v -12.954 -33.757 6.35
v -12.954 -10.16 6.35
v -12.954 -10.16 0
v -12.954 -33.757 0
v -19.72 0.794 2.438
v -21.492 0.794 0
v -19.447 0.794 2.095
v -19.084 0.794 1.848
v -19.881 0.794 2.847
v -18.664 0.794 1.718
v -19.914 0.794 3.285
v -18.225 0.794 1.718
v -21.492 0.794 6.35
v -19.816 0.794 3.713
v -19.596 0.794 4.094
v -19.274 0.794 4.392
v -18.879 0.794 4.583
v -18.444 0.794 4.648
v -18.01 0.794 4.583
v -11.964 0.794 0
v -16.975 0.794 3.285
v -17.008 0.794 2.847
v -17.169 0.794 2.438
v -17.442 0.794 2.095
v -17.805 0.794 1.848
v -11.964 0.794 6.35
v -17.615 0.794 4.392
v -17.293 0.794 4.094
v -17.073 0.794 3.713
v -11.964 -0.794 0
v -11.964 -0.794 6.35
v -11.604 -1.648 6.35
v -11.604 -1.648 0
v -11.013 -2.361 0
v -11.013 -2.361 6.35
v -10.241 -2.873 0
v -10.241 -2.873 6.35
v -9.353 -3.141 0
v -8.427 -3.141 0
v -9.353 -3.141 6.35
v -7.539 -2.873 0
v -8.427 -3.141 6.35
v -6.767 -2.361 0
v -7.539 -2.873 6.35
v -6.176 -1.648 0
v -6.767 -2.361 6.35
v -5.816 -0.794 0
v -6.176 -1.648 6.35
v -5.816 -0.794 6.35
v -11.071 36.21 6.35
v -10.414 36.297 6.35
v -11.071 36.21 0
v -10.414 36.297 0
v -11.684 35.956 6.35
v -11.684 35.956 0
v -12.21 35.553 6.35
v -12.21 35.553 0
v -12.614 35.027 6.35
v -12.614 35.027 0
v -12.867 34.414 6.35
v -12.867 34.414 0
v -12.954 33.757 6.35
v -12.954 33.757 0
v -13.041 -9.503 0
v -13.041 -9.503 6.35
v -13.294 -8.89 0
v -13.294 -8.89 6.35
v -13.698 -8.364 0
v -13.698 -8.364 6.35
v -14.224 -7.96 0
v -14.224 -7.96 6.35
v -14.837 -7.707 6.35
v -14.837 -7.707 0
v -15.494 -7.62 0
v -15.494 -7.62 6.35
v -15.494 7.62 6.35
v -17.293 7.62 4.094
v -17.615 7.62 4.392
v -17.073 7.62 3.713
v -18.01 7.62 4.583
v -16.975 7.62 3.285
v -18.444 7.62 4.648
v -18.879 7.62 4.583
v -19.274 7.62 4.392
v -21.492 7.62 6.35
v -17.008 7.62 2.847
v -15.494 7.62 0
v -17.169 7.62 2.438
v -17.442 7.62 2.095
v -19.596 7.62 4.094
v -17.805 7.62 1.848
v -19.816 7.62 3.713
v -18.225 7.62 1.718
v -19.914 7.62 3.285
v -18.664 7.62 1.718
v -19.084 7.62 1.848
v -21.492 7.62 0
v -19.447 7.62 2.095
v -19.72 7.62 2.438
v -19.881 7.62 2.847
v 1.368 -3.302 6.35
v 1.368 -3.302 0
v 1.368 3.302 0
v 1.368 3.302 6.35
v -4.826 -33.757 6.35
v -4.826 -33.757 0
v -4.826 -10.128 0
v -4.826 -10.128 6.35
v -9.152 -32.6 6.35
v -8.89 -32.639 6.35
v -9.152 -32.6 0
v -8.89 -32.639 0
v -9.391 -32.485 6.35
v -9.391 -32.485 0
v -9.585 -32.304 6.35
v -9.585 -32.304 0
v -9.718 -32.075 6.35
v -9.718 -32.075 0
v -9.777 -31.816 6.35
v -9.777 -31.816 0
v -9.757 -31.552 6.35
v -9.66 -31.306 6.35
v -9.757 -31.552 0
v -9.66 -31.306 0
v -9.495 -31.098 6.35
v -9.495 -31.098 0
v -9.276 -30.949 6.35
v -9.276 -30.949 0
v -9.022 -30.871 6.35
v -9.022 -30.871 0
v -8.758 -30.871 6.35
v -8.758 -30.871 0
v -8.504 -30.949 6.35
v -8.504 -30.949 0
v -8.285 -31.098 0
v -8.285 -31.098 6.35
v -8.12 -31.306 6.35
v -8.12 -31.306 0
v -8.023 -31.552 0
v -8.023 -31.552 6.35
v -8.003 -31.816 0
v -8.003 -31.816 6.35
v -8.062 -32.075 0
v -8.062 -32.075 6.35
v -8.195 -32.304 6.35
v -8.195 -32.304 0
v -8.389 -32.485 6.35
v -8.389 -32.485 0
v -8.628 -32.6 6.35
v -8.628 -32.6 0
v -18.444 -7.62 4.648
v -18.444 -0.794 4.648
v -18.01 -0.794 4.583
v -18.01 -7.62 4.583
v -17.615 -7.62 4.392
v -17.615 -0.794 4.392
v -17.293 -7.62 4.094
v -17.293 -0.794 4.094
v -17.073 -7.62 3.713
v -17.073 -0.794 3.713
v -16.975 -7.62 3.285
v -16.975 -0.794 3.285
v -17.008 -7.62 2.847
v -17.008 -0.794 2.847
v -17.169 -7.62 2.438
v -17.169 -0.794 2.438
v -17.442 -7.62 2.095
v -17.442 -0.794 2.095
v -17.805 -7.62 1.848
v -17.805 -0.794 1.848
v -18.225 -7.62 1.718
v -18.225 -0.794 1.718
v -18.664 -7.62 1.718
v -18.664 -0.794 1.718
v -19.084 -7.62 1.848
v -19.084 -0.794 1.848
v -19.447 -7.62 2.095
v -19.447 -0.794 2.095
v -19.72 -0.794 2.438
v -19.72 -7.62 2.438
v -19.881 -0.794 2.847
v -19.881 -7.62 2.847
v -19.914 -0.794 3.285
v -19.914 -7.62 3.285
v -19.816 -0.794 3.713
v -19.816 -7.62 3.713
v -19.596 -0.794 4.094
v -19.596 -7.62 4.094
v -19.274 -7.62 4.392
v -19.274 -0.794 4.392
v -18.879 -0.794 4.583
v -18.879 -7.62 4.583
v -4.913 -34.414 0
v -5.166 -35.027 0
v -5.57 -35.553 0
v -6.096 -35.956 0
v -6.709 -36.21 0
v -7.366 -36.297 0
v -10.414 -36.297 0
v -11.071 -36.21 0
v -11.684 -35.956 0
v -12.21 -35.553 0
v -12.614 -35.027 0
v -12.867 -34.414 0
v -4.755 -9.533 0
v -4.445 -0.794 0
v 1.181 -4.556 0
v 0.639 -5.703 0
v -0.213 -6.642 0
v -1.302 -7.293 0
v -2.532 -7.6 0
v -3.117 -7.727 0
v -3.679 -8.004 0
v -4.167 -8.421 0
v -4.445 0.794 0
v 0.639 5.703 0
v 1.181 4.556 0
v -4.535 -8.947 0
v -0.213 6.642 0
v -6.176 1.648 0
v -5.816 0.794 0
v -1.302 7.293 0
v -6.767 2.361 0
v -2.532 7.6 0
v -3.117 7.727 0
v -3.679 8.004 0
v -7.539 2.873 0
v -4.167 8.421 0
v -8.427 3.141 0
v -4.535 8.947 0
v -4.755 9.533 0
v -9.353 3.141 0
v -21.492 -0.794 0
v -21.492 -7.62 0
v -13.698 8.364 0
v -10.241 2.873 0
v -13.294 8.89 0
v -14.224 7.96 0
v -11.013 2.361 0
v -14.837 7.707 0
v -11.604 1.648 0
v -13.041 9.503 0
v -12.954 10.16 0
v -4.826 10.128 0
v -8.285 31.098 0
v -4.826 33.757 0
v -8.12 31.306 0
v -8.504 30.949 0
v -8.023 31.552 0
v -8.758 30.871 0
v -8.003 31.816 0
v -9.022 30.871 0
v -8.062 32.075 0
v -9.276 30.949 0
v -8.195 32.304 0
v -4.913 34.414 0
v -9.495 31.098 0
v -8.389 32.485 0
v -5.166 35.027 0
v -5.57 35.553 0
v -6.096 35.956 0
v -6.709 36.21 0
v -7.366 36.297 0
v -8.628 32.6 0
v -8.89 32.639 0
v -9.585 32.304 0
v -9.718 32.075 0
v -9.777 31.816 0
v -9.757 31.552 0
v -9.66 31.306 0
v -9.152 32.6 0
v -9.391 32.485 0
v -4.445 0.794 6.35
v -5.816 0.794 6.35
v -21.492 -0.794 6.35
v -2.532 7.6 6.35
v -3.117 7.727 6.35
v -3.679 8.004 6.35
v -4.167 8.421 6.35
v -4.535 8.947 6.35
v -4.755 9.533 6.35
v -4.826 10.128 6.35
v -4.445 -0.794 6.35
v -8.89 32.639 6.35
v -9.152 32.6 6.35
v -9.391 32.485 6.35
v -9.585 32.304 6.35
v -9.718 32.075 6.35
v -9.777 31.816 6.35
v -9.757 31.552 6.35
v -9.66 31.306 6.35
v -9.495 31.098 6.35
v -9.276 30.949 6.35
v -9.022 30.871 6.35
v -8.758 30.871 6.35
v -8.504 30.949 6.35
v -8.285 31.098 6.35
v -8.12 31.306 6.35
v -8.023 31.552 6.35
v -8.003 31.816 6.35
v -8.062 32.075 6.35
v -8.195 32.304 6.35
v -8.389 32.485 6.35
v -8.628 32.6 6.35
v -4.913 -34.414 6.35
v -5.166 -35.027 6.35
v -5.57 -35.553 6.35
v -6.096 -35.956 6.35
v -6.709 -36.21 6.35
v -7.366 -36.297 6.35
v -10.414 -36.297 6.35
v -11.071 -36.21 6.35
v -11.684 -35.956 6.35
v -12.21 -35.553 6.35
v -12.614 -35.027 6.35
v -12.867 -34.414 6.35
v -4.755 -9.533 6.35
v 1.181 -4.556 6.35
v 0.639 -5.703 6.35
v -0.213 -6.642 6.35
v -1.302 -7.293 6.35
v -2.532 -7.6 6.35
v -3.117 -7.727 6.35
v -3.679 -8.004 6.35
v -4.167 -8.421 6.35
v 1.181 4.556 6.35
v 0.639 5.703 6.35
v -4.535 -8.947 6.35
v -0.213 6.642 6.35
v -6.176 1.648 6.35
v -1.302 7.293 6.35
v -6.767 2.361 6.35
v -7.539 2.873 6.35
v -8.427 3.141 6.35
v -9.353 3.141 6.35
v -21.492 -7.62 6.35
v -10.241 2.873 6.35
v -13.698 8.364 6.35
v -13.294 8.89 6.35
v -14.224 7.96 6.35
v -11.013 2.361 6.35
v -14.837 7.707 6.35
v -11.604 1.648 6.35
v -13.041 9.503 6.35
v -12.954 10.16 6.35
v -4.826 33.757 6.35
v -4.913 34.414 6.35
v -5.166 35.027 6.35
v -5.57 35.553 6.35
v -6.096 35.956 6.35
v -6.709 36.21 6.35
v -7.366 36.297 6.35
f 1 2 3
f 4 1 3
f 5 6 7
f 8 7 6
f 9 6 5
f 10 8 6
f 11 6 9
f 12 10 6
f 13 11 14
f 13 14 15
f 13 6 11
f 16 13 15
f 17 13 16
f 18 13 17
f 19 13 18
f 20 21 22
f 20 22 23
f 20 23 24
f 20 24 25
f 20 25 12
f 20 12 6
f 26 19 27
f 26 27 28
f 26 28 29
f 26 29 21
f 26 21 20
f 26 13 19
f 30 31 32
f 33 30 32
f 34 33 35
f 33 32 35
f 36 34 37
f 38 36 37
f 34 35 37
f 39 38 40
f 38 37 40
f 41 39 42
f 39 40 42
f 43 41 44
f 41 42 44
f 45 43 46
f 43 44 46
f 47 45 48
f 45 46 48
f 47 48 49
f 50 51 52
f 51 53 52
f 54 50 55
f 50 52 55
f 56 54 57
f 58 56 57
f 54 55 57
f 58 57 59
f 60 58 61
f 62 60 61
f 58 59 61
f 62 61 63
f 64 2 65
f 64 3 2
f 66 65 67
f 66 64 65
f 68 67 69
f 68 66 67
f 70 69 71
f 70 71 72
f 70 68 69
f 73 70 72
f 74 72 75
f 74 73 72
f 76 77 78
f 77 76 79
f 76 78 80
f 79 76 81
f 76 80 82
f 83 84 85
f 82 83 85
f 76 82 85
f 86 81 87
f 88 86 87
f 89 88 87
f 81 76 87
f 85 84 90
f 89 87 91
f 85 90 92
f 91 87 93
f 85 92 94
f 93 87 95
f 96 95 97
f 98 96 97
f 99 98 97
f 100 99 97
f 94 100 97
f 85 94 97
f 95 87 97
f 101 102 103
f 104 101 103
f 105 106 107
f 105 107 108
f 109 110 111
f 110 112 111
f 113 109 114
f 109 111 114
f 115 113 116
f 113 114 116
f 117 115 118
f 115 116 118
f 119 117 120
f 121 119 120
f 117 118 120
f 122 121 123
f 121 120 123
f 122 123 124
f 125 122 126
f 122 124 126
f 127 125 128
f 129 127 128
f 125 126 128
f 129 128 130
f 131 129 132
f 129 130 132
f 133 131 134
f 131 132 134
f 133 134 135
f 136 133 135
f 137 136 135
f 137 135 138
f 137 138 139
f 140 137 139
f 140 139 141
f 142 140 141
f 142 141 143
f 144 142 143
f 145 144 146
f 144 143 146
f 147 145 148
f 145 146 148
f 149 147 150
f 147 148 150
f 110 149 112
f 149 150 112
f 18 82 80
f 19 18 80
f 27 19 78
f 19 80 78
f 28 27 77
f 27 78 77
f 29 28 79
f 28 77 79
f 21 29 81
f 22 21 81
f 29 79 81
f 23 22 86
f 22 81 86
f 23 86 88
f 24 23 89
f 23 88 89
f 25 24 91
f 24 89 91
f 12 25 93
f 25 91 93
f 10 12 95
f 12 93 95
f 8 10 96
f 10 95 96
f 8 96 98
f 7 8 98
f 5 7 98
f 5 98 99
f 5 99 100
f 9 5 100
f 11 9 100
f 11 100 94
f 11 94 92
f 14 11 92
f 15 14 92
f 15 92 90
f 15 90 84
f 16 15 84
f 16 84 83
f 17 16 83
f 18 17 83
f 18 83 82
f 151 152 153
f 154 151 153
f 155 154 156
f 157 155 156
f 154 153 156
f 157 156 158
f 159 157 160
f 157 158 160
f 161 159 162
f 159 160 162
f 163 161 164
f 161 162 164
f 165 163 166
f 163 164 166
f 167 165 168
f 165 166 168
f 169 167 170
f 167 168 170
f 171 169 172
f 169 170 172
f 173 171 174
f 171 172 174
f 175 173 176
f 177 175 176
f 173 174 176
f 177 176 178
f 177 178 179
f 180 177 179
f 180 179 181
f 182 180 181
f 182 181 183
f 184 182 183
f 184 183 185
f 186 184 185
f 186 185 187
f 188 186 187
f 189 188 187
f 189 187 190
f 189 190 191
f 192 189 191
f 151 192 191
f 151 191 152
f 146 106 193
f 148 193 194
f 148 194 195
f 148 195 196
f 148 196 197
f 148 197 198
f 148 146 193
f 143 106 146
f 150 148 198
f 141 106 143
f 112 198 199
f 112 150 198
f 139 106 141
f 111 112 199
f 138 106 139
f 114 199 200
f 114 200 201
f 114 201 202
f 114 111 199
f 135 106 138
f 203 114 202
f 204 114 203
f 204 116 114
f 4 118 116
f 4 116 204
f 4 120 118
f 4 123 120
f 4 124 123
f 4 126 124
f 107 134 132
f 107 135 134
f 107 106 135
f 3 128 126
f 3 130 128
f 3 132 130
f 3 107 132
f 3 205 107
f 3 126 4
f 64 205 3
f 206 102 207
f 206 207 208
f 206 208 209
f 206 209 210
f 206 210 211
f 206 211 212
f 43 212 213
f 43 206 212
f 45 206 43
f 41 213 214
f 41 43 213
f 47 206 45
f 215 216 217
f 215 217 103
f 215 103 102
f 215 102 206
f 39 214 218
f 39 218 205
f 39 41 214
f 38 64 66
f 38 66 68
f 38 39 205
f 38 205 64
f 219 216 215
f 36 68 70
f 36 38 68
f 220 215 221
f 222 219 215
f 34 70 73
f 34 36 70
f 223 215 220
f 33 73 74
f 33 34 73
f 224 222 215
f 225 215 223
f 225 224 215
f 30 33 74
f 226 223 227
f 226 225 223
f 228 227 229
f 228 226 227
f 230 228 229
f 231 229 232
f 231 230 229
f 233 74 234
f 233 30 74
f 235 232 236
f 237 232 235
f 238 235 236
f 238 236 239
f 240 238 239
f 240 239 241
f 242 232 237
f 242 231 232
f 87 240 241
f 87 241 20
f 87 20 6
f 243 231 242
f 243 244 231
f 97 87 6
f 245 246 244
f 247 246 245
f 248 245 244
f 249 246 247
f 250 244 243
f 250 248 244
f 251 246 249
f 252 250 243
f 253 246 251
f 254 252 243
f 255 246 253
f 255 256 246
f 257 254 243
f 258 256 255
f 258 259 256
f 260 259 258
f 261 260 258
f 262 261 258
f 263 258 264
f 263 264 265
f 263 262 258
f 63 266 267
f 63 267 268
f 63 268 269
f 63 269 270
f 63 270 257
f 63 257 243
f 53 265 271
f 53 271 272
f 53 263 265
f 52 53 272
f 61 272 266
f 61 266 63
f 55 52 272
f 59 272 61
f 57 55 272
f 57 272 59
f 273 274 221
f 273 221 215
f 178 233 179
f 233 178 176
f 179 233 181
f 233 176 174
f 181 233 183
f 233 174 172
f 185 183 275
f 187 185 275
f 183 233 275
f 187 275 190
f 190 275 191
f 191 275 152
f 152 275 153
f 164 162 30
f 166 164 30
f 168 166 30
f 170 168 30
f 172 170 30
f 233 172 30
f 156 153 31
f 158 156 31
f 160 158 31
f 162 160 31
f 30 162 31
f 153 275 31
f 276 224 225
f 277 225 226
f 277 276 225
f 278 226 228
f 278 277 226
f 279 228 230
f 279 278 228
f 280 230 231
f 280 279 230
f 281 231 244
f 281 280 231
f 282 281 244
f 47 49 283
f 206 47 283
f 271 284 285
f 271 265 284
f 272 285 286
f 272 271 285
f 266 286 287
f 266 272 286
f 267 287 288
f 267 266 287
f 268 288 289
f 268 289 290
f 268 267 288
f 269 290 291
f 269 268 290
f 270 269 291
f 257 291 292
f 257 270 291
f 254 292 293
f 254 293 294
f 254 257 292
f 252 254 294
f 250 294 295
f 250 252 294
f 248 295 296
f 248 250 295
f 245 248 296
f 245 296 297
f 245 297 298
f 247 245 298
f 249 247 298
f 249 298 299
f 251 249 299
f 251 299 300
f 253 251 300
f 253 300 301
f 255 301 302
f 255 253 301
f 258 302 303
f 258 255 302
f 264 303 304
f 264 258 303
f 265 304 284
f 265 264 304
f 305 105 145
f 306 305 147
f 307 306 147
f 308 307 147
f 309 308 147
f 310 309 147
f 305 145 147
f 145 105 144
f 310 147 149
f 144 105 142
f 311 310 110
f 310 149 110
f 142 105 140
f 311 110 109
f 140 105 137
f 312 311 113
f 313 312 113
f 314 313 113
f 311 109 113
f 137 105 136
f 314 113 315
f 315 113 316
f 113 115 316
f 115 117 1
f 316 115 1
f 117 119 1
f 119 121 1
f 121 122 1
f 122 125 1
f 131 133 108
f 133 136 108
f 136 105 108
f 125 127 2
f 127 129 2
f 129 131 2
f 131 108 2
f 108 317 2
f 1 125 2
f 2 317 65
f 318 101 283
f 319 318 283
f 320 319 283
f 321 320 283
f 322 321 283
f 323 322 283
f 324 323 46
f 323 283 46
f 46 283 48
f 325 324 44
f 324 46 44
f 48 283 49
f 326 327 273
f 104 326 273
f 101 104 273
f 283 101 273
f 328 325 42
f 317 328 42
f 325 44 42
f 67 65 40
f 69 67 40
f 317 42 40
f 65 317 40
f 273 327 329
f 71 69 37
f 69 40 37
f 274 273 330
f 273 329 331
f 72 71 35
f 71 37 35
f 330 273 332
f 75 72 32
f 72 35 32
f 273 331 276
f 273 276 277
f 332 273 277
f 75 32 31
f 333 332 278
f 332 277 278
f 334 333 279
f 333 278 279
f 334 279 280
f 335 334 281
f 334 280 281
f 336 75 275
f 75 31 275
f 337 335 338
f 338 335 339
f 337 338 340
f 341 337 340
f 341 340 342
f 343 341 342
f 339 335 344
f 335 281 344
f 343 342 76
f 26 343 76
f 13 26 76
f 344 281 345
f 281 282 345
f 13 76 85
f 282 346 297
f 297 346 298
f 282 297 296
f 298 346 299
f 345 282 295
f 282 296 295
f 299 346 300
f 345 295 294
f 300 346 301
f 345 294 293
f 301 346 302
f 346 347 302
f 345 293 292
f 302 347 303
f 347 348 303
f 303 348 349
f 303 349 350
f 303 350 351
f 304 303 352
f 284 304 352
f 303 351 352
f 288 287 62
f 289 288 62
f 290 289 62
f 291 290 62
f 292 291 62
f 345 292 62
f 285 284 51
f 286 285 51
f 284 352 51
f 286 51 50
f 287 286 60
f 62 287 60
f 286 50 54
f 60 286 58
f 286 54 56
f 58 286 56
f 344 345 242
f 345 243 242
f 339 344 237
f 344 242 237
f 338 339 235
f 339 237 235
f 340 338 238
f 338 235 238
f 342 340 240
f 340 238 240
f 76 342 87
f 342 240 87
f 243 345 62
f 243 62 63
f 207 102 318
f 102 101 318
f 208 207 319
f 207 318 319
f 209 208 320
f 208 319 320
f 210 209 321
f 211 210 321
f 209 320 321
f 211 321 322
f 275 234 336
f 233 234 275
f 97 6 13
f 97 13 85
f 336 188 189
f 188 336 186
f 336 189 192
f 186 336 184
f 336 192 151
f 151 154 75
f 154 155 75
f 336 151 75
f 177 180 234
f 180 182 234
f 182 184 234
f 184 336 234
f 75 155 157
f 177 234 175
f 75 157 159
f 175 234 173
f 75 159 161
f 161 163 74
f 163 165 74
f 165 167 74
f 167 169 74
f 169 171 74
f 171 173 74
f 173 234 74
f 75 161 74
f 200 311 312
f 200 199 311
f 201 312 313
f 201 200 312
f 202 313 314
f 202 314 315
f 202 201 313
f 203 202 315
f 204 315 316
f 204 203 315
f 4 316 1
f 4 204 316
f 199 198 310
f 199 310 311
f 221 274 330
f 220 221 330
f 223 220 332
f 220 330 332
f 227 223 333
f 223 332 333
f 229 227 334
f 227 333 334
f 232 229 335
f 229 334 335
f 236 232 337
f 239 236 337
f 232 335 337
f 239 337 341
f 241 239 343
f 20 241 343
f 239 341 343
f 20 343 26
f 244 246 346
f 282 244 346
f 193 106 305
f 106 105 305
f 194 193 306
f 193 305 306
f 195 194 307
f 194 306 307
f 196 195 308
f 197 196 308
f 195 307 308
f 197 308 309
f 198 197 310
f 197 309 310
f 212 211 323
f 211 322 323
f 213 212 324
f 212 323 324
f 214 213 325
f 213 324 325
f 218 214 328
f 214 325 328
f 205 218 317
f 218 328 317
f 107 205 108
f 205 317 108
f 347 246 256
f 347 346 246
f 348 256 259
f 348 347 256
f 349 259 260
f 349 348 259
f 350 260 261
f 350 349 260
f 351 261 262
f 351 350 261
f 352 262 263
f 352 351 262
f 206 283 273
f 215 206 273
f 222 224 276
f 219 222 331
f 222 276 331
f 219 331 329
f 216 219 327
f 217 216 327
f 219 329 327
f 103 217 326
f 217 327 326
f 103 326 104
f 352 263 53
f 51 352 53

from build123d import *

# Parameters (mm, degrees)
EXTRUDE1_DEPTH              = 6.35
SKETCH2_W                   = 17.047492734
SKETCH2_H                   = 1.5875
EXTRUDE2_DEPTH              = 7.35
SKETCH4_R                   = 3.175
EXTRUDE4_DEPTH              = 7.35
FILLET2_R                   = 4.318
F_32_0_116_DIAMETER_HOLE1_D = 2.9464
EXTRUDE8_DEPTH              = 28.6766
FILLET1_R                   = 2.54


with BuildPart() as part:
    # Sketch1 → Extrude1 (new body)
    with BuildSketch(Plane.XY):
        Polygon((-21.492492734, 7.62), (-6.252492734, 7.62), (1.367507266, 7.62), (1.367507266, 0), (1.367507266, -7.62), (-6.252492734, -7.62), (-21.492492734, -7.62), align=None)
    extrude(amount=EXTRUDE1_DEPTH)

    # Sketch2 → Extrude2 (cut, through all)
    with BuildSketch(Plane.XY.offset(6.35)):
        with Locations((-12.968746367, 0)):
            Rectangle(SKETCH2_W, SKETCH2_H)
    extrude(amount=-EXTRUDE2_DEPTH, mode=Mode.SUBTRACT)

    # Sketch4 → Extrude4 (cut, through all)
    with BuildSketch(Plane.XY.offset(6.35)):
        with Locations((-8.89, 0)):
            Circle(SKETCH4_R)
    extrude(amount=-EXTRUDE4_DEPTH, mode=Mode.SUBTRACT)

    # Fillet2
    fillet2_edges = [part.edges().sort_by_distance(p)[0] for p in [
        (1.367507266, 7.62, 3.175),
        (1.367507266, -7.62, 3.175),
    ]]
    fillet(fillet2_edges, radius=FILLET2_R)

    # #32 (0.116) Diameter Hole1 (through all)
    with Locations(Plane(origin=(-18.444492734, -7.62, 3.175), x_dir=(0, 0, -1), z_dir=(0, -1, 0))):
        with Locations((0, 0)):
            Hole(F_32_0_116_DIAMETER_HOLE1_D / 2)

    # Sketch21 → Extrude8 (add)
    with BuildSketch(Plane(origin=(0, 7.62, 0), x_dir=(1, 0, 0), z_dir=(0, 1, 0))):
        Polygon((-8.89, 0), (-4.826, 0), (-4.826, -6.35), (-12.954, -6.35), (-12.954, 0), align=None)
    extrude8 = extrude(amount=EXTRUDE8_DEPTH)

    # Sketch27 → #50 (0.07) Diameter Hole1 (revolve, cut)
    with BuildSketch(Plane(origin=(-8.89, 31.75, 0), x_dir=(0, 1, 0), z_dir=(1, 0, 0))):
        Polygon((0, 0), (0, 6.88416509), (0.889, 6.35), (0.889, 0), align=None)
    f_50_0_07_diameter_hole1 = revolve(axis=Axis((-8.89, 31.75, -6.35), (0, 0, 1)), mode=Mode.SUBTRACT)

    # Mirror2: Extrude8, #50 (0.07) Diameter Hole1 across plane
    add(extrude8.mirror(Plane.ZX))
    add(f_50_0_07_diameter_hole1.mirror(Plane.ZX), mode=Mode.SUBTRACT)

    # Fillet1
    fillet1_edges = [part.edges().sort_by_distance(p)[0] for p in [
        (-12.954, 7.62, 3.175),
        (-4.826, 7.62, 3.175),
        (-12.954, 36.2966, 3.175),
        (-4.826, 36.2966, 3.175),
        (-12.954, -36.2966, 3.175),
        (-12.954, -7.62, 3.175),
        (-4.826, -7.62, 3.175),
        (-4.826, -36.2966, 3.175),
    ]]
    fillet(fillet1_edges, radius=FILLET1_R)


solid = part.part
